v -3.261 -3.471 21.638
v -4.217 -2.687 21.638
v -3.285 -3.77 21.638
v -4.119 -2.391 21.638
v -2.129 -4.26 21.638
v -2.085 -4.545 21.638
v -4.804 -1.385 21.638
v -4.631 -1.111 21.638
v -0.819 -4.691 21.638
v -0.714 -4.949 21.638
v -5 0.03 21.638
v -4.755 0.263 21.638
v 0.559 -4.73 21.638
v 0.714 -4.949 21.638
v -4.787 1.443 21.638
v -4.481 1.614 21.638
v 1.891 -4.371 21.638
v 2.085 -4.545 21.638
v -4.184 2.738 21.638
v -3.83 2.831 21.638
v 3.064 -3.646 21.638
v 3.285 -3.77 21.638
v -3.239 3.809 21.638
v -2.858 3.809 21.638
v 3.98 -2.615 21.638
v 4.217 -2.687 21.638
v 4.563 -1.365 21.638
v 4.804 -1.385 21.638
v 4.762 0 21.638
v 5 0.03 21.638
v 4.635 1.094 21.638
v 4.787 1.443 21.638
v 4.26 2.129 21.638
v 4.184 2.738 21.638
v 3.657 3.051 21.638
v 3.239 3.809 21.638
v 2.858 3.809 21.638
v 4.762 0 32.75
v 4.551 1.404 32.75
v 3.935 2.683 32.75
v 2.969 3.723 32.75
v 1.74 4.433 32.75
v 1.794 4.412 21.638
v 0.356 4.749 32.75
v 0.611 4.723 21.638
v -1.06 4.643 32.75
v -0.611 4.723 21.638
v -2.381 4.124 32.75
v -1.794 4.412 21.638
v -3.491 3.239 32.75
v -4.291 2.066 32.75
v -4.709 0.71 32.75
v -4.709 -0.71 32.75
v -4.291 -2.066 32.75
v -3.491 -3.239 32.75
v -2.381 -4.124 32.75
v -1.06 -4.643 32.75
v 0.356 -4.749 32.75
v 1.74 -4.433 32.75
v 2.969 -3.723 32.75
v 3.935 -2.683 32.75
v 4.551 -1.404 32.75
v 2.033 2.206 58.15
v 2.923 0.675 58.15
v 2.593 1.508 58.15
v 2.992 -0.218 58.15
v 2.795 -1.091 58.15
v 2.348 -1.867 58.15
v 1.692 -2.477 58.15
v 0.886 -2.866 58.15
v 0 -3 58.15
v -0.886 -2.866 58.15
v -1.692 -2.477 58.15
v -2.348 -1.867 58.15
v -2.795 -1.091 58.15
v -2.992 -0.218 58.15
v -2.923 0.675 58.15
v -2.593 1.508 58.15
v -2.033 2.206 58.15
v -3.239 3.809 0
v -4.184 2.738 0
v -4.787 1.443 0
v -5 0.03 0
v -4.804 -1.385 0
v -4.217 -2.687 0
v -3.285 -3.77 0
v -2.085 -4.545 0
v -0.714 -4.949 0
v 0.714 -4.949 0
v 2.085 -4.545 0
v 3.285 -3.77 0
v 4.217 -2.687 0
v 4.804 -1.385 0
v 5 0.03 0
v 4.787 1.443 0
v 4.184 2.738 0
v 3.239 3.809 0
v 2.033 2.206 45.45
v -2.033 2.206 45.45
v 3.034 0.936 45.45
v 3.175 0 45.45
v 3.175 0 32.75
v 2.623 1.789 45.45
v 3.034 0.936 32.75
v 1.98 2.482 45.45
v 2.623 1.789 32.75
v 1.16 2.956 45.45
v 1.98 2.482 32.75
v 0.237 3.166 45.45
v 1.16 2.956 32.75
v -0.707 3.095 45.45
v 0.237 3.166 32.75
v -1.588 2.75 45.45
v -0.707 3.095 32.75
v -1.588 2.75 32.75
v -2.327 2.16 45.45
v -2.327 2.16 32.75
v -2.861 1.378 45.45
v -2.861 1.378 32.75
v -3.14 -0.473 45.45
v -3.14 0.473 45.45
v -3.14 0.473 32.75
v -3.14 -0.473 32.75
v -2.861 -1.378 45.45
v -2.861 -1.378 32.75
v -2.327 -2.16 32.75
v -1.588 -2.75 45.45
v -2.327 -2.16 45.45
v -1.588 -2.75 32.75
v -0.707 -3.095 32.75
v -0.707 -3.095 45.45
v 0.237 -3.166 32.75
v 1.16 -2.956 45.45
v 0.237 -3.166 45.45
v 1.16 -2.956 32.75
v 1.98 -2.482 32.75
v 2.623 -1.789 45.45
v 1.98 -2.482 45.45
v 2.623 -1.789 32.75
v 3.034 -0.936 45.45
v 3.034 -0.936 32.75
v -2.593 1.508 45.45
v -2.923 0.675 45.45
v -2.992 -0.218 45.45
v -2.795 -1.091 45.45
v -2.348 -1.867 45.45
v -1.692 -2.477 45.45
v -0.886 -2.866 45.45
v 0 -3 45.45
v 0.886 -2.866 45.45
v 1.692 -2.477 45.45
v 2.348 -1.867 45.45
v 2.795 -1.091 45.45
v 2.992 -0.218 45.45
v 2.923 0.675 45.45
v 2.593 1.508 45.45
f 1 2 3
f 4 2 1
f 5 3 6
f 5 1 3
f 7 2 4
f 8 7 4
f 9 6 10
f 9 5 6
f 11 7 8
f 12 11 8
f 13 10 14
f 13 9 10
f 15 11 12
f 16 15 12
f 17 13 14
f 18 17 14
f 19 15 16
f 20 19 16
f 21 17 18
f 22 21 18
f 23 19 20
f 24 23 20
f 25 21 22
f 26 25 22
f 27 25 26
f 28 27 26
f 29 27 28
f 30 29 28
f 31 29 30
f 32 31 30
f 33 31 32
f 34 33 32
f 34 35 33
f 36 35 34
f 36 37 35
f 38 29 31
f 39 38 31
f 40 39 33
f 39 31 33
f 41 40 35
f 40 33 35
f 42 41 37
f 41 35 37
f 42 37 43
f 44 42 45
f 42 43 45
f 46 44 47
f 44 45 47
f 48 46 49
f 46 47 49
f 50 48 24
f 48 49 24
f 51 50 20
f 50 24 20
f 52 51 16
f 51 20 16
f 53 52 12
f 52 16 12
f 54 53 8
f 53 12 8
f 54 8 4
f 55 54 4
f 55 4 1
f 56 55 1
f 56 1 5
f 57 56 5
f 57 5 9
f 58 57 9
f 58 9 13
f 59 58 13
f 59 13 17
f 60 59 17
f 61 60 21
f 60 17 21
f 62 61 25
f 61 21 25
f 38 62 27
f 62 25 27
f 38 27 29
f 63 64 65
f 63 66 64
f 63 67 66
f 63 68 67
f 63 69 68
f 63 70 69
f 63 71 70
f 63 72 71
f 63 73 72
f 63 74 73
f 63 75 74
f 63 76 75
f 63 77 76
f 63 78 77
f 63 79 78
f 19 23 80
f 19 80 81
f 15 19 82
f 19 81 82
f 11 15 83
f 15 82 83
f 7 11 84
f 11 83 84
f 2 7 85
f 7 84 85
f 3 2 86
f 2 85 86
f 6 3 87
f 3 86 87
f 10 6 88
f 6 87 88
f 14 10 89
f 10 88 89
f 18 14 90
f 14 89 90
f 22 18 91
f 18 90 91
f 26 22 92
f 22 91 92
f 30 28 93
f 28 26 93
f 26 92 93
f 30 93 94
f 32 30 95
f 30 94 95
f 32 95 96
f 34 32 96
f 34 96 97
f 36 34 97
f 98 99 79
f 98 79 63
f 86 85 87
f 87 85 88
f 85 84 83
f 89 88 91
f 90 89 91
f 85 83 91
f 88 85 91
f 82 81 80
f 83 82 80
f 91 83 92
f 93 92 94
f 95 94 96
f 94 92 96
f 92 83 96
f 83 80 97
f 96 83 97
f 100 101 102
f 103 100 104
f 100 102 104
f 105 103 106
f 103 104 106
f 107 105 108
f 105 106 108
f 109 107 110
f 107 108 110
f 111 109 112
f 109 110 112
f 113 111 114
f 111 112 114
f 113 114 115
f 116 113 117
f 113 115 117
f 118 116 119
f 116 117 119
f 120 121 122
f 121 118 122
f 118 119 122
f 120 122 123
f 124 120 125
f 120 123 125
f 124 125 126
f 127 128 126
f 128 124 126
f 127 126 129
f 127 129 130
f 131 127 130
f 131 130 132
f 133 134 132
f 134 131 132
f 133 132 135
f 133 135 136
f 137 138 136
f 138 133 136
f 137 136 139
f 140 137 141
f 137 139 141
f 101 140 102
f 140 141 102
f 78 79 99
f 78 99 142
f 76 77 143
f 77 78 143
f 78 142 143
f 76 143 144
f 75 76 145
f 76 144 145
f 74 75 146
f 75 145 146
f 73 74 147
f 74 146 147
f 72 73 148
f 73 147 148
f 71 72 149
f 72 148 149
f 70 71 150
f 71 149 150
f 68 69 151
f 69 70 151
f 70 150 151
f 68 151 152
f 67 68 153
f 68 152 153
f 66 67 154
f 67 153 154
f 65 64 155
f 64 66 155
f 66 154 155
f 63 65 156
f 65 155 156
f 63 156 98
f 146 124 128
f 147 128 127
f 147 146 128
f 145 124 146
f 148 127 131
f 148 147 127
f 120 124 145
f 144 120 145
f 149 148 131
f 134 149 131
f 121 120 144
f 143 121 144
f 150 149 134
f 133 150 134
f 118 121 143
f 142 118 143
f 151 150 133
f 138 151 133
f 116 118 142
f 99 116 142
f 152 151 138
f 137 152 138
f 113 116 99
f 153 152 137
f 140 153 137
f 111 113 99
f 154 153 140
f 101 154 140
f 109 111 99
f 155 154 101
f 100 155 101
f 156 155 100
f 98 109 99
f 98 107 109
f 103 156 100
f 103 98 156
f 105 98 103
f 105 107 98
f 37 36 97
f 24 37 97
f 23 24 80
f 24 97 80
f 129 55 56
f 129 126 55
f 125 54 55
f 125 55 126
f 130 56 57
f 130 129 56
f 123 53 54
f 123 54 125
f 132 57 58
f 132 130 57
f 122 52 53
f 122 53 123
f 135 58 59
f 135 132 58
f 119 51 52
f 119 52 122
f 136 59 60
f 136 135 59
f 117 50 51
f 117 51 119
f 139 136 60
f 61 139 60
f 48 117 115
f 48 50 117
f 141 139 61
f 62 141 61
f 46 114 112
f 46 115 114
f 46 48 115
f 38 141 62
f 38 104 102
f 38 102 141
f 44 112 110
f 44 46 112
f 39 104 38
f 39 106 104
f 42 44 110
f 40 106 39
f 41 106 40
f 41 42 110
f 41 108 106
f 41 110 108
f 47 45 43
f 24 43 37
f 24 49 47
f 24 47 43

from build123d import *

# Parameters (mm, degrees)
SKETCH1_R           = 5
BOSS_EXTRUDE1_DEPTH = 21.637500032
SKETCH2_R           = 4.7625
BOSS_EXTRUDE2_DEPTH = 11.1125
SKETCH3_R           = 3.175
BOSS_EXTRUDE3_DEPTH = 12.7
SKETCH4_W           = 25.4
SKETCH4_H           = 2.38125
CUT_EXTRUDE1_DEPTH  = 21.637500032
SKETCH6_R           = 3
BOSS_EXTRUDE4_DEPTH = 12.7
SKETCH7_W           = 25.37250579
SKETCH7_H           = 1.5875
CUT_EXTRUDE3_DEPTH  = 12.7


with BuildPart() as part:
    # Sketch1 → Boss-Extrude1 (new body)
    with BuildSketch(Plane.XY):
        Circle(SKETCH1_R)
    extrude(amount=BOSS_EXTRUDE1_DEPTH)

    # Sketch2 → Boss-Extrude2 (add)
    with BuildSketch(Plane.XY.offset(21.637500032)):
        Circle(SKETCH2_R)
    extrude(amount=BOSS_EXTRUDE2_DEPTH)

    # Sketch3 → Boss-Extrude3 (add)
    with BuildSketch(Plane.XY.offset(32.750000032)):
        Circle(SKETCH3_R)
    extrude(amount=BOSS_EXTRUDE3_DEPTH)

    # Sketch4 → Cut-Extrude1 (cut)
    with BuildSketch(Plane(origin=(0, 0, 0), x_dir=(-1, 0, 0), z_dir=(0, 0, -1))):
        with Locations((0, 5)):
            Rectangle(SKETCH4_W, SKETCH4_H)
    extrude(amount=-CUT_EXTRUDE1_DEPTH, mode=Mode.SUBTRACT)

    # Sketch6 → Boss-Extrude4 (add)
    with BuildSketch(Plane.XY.offset(45.450000032)):
        Circle(SKETCH6_R)
    extrude(amount=BOSS_EXTRUDE4_DEPTH)

    # Sketch7 → Cut-Extrude3 (cut)
    with BuildSketch(Plane.XY.offset(58.150000032)):
        with Locations((0, 3)):
            Rectangle(SKETCH7_W, SKETCH7_H)
    extrude(amount=-CUT_EXTRUDE3_DEPTH, mode=Mode.SUBTRACT)


solid = part.part
